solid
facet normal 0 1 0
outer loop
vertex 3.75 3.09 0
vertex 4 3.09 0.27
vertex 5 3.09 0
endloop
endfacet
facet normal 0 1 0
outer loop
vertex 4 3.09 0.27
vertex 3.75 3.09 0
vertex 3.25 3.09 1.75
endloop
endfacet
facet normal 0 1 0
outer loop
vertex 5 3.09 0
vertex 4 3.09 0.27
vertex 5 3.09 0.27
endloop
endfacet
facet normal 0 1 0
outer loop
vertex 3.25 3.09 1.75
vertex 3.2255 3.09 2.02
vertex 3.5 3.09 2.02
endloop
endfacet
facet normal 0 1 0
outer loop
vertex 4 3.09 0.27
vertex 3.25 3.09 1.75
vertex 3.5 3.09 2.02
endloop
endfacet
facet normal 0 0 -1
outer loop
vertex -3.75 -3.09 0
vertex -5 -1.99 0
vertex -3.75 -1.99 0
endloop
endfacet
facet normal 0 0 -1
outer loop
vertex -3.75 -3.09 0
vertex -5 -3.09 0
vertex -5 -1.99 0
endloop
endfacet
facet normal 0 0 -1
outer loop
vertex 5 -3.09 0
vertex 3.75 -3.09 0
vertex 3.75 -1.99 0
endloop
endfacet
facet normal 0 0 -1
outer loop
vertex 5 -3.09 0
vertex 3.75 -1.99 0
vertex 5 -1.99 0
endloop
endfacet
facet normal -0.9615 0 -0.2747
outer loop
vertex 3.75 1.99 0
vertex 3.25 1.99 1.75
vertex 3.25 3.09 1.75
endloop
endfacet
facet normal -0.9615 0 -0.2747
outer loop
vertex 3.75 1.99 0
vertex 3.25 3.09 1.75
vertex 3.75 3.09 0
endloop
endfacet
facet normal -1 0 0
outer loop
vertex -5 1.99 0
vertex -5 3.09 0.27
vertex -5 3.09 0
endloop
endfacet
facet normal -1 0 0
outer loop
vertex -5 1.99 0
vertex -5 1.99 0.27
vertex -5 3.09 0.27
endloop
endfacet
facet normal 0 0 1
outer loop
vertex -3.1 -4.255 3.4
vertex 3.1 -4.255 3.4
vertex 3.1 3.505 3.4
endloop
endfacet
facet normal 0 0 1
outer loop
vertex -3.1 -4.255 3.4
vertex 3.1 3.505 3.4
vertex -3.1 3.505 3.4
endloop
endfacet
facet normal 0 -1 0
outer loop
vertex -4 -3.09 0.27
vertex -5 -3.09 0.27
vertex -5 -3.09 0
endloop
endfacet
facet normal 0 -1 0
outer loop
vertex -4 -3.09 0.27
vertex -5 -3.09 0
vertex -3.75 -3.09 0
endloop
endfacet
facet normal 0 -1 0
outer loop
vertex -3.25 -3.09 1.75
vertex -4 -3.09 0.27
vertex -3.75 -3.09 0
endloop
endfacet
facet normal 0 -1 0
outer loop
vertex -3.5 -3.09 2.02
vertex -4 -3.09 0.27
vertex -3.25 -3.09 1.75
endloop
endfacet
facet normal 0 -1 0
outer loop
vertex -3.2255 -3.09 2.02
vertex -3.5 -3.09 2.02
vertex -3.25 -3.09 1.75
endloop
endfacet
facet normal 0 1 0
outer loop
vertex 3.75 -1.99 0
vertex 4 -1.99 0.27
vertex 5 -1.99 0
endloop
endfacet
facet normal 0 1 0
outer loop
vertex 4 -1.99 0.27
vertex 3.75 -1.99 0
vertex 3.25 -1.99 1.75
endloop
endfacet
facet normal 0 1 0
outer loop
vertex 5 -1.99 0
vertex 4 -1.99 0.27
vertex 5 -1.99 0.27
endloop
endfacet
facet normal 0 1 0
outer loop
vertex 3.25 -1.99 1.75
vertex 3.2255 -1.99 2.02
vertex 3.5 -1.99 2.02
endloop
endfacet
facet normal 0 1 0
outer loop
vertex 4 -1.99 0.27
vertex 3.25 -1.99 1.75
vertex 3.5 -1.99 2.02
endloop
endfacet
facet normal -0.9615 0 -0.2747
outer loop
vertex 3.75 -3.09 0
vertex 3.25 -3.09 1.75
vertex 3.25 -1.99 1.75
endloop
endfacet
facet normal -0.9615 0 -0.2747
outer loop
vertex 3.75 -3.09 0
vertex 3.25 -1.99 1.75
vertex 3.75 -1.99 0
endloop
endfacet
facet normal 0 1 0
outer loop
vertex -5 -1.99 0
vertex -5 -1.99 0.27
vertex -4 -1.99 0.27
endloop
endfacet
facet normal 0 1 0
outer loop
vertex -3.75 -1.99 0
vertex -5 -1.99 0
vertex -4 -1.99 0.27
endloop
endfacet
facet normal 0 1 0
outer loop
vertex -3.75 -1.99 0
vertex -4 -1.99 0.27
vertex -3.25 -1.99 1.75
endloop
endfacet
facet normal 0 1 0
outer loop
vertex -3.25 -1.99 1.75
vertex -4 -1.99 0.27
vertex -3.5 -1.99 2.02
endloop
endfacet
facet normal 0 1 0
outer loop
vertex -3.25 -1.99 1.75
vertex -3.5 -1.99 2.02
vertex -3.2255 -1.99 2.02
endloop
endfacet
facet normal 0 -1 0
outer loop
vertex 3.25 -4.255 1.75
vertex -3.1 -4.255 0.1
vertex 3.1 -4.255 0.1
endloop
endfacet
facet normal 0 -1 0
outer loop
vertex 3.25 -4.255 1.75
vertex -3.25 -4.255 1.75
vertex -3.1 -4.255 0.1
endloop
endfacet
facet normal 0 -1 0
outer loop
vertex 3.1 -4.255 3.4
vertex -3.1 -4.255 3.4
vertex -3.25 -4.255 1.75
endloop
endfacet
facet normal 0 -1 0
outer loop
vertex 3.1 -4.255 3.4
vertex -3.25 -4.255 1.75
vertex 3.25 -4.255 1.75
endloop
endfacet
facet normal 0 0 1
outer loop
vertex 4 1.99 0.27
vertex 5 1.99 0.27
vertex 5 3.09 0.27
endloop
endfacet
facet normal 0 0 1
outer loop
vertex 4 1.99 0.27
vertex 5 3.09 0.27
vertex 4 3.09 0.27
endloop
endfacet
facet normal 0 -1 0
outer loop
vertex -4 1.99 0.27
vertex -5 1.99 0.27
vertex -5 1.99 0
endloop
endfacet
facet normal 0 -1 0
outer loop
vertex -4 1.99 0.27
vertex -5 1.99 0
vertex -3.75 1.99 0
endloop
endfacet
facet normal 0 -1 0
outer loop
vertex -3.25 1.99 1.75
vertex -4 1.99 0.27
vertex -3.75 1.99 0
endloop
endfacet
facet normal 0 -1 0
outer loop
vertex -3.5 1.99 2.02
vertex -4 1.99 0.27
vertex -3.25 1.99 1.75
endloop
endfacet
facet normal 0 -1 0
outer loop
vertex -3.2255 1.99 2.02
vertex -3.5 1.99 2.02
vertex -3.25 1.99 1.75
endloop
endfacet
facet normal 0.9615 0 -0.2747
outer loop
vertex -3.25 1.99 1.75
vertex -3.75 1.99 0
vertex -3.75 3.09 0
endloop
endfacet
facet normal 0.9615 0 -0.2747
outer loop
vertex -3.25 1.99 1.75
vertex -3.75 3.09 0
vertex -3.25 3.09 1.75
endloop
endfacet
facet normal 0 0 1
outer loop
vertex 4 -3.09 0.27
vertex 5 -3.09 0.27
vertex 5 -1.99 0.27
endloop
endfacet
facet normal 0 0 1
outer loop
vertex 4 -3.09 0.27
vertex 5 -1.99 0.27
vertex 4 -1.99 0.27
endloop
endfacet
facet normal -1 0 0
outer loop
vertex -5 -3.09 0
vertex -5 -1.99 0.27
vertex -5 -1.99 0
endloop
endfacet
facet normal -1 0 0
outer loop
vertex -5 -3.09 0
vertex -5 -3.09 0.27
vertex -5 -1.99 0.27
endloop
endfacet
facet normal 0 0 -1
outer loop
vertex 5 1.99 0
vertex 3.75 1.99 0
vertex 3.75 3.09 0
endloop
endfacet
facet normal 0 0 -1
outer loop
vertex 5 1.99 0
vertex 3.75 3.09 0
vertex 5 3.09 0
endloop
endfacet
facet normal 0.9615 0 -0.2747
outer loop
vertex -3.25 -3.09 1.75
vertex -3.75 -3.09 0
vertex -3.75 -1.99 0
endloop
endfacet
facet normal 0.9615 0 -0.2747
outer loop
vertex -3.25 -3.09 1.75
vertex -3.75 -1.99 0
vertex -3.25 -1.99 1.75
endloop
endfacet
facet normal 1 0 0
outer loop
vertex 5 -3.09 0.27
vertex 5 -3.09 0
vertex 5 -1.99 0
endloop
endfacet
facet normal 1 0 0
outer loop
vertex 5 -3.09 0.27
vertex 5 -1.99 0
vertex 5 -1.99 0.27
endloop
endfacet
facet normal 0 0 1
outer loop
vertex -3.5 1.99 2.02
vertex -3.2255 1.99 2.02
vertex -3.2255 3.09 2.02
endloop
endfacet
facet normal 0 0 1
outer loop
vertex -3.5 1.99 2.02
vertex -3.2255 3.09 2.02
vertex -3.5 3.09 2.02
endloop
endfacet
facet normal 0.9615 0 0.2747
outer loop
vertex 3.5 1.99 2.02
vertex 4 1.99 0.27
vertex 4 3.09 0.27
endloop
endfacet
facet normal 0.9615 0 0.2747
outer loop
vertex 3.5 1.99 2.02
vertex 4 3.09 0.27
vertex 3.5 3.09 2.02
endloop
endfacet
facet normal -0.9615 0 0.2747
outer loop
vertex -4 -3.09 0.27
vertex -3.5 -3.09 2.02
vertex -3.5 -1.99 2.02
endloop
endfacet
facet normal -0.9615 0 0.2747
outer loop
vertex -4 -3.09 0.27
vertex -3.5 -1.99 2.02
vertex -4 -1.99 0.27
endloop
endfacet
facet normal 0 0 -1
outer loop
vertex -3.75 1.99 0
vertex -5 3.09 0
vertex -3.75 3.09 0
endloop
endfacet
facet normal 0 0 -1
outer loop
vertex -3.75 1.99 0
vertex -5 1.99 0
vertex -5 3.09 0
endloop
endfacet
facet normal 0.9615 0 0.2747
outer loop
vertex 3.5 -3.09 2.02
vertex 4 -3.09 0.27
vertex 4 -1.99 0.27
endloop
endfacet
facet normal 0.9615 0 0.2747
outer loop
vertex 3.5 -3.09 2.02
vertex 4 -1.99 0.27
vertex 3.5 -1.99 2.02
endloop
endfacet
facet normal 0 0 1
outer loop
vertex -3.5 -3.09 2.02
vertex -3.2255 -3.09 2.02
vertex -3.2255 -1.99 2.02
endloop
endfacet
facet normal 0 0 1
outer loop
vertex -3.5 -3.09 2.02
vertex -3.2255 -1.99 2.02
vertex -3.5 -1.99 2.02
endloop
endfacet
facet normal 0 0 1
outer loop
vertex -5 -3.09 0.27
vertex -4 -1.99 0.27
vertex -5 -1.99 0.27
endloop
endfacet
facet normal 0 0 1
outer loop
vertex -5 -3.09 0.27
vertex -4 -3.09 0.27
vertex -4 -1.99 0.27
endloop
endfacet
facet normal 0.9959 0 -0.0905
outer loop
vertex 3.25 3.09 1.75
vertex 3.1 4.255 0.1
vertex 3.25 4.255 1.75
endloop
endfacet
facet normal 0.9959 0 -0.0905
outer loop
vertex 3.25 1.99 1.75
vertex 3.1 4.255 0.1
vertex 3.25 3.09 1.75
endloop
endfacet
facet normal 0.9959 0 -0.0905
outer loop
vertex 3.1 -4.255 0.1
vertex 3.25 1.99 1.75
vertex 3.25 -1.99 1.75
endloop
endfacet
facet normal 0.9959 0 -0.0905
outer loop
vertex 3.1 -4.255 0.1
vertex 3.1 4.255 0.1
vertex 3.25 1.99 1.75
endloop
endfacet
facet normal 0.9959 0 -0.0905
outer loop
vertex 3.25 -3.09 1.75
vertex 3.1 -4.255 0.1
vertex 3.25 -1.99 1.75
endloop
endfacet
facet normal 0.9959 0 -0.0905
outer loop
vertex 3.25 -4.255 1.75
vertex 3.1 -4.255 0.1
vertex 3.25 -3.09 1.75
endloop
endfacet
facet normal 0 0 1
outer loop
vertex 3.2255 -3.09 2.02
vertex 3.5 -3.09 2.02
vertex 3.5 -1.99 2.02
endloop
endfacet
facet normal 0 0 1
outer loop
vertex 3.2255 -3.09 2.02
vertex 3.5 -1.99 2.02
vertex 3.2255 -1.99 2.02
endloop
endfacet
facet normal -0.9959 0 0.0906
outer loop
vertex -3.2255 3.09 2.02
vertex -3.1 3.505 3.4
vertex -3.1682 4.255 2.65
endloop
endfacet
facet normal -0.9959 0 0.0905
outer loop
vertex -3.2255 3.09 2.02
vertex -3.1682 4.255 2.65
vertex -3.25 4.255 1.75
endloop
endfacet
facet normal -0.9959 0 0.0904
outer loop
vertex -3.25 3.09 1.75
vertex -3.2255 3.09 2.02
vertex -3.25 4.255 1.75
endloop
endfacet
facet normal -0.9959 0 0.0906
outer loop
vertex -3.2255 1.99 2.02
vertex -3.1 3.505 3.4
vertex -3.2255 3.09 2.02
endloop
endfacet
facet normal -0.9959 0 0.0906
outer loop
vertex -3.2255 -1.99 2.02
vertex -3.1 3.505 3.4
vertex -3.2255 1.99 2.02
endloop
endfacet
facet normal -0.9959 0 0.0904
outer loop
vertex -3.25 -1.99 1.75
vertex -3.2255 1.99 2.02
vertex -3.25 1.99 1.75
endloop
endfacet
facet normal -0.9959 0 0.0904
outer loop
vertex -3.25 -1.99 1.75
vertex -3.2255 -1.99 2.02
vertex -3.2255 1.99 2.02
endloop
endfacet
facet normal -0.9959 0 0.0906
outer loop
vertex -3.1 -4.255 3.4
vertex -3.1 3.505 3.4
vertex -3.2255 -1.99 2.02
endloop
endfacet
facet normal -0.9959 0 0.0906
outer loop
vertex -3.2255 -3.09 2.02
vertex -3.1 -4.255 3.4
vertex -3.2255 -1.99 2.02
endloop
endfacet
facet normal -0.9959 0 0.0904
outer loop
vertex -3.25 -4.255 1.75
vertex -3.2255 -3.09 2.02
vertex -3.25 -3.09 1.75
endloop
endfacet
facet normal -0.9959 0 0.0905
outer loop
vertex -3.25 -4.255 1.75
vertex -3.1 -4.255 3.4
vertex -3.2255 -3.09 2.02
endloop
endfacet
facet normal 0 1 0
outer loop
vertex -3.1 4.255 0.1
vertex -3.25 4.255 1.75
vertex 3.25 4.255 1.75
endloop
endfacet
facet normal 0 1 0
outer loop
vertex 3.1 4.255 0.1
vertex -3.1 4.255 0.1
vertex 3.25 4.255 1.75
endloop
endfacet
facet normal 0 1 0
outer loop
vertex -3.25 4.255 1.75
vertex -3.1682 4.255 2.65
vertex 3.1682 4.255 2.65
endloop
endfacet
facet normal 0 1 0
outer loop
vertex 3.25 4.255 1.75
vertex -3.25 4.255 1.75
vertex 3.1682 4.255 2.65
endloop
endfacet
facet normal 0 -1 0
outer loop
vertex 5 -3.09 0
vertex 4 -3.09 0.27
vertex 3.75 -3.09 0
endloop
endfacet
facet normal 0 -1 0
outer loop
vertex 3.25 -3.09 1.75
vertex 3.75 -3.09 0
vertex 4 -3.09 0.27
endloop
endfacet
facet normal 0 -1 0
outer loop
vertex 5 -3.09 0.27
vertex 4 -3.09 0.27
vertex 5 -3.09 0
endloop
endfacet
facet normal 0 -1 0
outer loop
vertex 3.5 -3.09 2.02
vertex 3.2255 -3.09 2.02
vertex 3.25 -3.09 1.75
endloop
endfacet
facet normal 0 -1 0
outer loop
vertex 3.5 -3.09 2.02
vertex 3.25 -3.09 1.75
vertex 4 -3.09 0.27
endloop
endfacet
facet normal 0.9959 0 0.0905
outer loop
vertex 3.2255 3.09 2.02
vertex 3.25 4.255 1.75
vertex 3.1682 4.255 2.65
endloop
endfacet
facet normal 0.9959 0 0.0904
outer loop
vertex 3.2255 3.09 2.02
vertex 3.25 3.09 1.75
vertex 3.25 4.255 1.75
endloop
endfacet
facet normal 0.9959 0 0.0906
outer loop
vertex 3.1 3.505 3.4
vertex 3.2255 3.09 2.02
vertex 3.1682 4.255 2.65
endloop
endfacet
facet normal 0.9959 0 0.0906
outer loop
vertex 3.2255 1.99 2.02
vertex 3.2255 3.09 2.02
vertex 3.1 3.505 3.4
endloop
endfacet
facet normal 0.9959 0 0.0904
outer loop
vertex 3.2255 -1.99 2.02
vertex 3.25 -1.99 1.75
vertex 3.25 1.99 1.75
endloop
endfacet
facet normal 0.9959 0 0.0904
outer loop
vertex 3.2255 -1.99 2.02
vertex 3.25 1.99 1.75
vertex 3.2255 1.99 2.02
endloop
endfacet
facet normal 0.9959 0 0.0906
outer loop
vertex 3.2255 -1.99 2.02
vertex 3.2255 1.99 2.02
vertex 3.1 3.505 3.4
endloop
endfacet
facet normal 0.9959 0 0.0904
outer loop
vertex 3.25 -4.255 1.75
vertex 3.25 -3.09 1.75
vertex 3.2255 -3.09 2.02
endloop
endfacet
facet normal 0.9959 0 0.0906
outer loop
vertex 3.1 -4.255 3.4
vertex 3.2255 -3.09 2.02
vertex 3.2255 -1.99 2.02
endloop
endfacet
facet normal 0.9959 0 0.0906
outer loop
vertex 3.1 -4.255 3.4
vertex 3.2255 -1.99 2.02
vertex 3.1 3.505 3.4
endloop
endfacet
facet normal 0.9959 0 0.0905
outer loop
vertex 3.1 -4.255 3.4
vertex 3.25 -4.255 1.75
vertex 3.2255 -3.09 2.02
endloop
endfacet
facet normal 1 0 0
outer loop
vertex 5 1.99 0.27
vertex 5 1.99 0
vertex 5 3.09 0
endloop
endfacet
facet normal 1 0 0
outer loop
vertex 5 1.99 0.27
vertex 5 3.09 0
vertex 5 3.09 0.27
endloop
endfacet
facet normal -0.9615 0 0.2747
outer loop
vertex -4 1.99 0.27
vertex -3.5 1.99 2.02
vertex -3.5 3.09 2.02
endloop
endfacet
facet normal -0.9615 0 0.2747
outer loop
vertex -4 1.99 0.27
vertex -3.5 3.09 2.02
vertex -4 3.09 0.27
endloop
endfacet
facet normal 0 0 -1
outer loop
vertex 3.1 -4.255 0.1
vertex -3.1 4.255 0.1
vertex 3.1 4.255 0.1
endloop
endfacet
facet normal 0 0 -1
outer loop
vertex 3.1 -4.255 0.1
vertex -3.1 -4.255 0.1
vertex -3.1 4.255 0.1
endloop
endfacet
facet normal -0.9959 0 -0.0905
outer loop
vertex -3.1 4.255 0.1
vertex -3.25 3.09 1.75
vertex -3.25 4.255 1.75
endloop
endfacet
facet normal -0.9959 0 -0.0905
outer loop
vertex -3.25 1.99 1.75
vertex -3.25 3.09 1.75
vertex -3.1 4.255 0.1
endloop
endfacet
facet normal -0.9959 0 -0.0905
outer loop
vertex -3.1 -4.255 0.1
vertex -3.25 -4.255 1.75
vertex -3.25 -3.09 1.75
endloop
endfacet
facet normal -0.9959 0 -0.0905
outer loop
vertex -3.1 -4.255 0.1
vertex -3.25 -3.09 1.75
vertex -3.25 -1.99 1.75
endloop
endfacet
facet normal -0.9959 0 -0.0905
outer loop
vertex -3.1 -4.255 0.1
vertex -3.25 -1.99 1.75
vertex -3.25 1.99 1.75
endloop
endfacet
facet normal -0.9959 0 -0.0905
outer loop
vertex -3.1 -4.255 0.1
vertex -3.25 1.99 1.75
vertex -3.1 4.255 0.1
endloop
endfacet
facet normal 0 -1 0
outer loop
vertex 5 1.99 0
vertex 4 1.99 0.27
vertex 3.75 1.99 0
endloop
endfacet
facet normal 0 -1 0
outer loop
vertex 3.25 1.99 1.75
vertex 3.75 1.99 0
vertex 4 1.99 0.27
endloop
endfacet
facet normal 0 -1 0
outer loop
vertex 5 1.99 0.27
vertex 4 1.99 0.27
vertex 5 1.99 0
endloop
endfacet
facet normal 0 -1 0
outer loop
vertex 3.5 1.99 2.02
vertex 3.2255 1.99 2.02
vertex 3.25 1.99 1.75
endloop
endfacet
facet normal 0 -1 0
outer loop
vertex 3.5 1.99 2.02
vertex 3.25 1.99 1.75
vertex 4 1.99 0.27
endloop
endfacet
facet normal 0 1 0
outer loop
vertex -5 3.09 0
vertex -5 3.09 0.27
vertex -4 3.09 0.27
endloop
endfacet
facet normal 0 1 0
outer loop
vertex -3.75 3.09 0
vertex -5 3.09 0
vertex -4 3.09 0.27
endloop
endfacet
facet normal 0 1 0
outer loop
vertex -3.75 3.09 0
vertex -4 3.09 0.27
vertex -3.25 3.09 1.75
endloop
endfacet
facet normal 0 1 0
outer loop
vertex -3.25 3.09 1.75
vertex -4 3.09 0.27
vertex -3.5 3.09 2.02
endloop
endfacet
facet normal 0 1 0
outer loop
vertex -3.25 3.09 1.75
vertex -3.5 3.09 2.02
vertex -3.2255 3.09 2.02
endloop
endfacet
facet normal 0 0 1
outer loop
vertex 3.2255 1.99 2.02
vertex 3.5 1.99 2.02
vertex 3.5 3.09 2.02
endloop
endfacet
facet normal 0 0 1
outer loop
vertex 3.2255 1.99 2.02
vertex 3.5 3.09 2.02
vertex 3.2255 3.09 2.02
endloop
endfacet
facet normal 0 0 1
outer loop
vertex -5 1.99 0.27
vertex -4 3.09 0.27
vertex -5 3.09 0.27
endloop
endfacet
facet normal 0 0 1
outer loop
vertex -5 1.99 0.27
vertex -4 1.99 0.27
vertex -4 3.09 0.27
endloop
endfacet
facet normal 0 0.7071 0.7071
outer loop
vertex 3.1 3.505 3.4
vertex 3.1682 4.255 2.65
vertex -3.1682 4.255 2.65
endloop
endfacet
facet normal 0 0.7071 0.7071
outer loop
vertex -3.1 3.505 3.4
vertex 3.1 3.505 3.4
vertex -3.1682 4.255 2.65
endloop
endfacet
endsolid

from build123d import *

# Parameters (mm, degrees)
PAD001_DEPTH = 0.55
PAD002_DEPTH = 0.55
PAD_DEPTH    = 4.255
CHAMFER_SIZE = 0.75


with BuildPart() as pad001:
    # Sketch001 → Pad001 (new body, symmetric)
    with BuildSketch(Plane.XZ.offset(2.54)):
        Polygon((-5, 0), (-3.75, 0), (-3.25, 1.75), (3.25, 1.75), (3.75, 0), (5, 0), (5, 0.27), (4, 0.27), (3.5, 2.02), (-3.5, 2.02), (-4, 0.27), (-5, 0.27), align=None)
    extrude(amount=PAD001_DEPTH, both=True)


with BuildPart() as pad002:
    # Sketch002 → Pad002 (new body, symmetric)
    with BuildSketch(Plane.XZ.offset(-2.54)):
        Polygon((-5, 0), (-3.75, 0), (-3.25, 1.75), (3.25, 1.75), (3.75, 0), (5, 0), (5, 0.27), (4, 0.27), (3.5, 2.02), (-3.5, 2.02), (-4, 0.27), (-5, 0.27), align=None)
    extrude(amount=PAD002_DEPTH, both=True)


with BuildPart() as diode_bridge_vishay_dfs:
    # Sketch → Pad (new body, symmetric)
    with BuildSketch(Plane.XZ):
        Polygon((-3.1, 0.1), (3.1, 0.1), (3.25, 1.75), (3.1, 3.4), (-3.1, 3.4), (-3.25, 1.75), align=None)
    extrude(amount=PAD_DEPTH, both=True)

    # Chamfer
    chamfer_edges = [diode_bridge_vishay_dfs.edges().sort_by_distance(p)[0] for p in [
        (0, 4.255, 3.4),
    ]]
    chamfer(chamfer_edges, length=CHAMFER_SIZE)

    # Chamfer_mp_cp: union Pad001, Pad002
    add(pad001.part)
    add(pad002.part)


solid = diode_bridge_vishay_dfs.part
